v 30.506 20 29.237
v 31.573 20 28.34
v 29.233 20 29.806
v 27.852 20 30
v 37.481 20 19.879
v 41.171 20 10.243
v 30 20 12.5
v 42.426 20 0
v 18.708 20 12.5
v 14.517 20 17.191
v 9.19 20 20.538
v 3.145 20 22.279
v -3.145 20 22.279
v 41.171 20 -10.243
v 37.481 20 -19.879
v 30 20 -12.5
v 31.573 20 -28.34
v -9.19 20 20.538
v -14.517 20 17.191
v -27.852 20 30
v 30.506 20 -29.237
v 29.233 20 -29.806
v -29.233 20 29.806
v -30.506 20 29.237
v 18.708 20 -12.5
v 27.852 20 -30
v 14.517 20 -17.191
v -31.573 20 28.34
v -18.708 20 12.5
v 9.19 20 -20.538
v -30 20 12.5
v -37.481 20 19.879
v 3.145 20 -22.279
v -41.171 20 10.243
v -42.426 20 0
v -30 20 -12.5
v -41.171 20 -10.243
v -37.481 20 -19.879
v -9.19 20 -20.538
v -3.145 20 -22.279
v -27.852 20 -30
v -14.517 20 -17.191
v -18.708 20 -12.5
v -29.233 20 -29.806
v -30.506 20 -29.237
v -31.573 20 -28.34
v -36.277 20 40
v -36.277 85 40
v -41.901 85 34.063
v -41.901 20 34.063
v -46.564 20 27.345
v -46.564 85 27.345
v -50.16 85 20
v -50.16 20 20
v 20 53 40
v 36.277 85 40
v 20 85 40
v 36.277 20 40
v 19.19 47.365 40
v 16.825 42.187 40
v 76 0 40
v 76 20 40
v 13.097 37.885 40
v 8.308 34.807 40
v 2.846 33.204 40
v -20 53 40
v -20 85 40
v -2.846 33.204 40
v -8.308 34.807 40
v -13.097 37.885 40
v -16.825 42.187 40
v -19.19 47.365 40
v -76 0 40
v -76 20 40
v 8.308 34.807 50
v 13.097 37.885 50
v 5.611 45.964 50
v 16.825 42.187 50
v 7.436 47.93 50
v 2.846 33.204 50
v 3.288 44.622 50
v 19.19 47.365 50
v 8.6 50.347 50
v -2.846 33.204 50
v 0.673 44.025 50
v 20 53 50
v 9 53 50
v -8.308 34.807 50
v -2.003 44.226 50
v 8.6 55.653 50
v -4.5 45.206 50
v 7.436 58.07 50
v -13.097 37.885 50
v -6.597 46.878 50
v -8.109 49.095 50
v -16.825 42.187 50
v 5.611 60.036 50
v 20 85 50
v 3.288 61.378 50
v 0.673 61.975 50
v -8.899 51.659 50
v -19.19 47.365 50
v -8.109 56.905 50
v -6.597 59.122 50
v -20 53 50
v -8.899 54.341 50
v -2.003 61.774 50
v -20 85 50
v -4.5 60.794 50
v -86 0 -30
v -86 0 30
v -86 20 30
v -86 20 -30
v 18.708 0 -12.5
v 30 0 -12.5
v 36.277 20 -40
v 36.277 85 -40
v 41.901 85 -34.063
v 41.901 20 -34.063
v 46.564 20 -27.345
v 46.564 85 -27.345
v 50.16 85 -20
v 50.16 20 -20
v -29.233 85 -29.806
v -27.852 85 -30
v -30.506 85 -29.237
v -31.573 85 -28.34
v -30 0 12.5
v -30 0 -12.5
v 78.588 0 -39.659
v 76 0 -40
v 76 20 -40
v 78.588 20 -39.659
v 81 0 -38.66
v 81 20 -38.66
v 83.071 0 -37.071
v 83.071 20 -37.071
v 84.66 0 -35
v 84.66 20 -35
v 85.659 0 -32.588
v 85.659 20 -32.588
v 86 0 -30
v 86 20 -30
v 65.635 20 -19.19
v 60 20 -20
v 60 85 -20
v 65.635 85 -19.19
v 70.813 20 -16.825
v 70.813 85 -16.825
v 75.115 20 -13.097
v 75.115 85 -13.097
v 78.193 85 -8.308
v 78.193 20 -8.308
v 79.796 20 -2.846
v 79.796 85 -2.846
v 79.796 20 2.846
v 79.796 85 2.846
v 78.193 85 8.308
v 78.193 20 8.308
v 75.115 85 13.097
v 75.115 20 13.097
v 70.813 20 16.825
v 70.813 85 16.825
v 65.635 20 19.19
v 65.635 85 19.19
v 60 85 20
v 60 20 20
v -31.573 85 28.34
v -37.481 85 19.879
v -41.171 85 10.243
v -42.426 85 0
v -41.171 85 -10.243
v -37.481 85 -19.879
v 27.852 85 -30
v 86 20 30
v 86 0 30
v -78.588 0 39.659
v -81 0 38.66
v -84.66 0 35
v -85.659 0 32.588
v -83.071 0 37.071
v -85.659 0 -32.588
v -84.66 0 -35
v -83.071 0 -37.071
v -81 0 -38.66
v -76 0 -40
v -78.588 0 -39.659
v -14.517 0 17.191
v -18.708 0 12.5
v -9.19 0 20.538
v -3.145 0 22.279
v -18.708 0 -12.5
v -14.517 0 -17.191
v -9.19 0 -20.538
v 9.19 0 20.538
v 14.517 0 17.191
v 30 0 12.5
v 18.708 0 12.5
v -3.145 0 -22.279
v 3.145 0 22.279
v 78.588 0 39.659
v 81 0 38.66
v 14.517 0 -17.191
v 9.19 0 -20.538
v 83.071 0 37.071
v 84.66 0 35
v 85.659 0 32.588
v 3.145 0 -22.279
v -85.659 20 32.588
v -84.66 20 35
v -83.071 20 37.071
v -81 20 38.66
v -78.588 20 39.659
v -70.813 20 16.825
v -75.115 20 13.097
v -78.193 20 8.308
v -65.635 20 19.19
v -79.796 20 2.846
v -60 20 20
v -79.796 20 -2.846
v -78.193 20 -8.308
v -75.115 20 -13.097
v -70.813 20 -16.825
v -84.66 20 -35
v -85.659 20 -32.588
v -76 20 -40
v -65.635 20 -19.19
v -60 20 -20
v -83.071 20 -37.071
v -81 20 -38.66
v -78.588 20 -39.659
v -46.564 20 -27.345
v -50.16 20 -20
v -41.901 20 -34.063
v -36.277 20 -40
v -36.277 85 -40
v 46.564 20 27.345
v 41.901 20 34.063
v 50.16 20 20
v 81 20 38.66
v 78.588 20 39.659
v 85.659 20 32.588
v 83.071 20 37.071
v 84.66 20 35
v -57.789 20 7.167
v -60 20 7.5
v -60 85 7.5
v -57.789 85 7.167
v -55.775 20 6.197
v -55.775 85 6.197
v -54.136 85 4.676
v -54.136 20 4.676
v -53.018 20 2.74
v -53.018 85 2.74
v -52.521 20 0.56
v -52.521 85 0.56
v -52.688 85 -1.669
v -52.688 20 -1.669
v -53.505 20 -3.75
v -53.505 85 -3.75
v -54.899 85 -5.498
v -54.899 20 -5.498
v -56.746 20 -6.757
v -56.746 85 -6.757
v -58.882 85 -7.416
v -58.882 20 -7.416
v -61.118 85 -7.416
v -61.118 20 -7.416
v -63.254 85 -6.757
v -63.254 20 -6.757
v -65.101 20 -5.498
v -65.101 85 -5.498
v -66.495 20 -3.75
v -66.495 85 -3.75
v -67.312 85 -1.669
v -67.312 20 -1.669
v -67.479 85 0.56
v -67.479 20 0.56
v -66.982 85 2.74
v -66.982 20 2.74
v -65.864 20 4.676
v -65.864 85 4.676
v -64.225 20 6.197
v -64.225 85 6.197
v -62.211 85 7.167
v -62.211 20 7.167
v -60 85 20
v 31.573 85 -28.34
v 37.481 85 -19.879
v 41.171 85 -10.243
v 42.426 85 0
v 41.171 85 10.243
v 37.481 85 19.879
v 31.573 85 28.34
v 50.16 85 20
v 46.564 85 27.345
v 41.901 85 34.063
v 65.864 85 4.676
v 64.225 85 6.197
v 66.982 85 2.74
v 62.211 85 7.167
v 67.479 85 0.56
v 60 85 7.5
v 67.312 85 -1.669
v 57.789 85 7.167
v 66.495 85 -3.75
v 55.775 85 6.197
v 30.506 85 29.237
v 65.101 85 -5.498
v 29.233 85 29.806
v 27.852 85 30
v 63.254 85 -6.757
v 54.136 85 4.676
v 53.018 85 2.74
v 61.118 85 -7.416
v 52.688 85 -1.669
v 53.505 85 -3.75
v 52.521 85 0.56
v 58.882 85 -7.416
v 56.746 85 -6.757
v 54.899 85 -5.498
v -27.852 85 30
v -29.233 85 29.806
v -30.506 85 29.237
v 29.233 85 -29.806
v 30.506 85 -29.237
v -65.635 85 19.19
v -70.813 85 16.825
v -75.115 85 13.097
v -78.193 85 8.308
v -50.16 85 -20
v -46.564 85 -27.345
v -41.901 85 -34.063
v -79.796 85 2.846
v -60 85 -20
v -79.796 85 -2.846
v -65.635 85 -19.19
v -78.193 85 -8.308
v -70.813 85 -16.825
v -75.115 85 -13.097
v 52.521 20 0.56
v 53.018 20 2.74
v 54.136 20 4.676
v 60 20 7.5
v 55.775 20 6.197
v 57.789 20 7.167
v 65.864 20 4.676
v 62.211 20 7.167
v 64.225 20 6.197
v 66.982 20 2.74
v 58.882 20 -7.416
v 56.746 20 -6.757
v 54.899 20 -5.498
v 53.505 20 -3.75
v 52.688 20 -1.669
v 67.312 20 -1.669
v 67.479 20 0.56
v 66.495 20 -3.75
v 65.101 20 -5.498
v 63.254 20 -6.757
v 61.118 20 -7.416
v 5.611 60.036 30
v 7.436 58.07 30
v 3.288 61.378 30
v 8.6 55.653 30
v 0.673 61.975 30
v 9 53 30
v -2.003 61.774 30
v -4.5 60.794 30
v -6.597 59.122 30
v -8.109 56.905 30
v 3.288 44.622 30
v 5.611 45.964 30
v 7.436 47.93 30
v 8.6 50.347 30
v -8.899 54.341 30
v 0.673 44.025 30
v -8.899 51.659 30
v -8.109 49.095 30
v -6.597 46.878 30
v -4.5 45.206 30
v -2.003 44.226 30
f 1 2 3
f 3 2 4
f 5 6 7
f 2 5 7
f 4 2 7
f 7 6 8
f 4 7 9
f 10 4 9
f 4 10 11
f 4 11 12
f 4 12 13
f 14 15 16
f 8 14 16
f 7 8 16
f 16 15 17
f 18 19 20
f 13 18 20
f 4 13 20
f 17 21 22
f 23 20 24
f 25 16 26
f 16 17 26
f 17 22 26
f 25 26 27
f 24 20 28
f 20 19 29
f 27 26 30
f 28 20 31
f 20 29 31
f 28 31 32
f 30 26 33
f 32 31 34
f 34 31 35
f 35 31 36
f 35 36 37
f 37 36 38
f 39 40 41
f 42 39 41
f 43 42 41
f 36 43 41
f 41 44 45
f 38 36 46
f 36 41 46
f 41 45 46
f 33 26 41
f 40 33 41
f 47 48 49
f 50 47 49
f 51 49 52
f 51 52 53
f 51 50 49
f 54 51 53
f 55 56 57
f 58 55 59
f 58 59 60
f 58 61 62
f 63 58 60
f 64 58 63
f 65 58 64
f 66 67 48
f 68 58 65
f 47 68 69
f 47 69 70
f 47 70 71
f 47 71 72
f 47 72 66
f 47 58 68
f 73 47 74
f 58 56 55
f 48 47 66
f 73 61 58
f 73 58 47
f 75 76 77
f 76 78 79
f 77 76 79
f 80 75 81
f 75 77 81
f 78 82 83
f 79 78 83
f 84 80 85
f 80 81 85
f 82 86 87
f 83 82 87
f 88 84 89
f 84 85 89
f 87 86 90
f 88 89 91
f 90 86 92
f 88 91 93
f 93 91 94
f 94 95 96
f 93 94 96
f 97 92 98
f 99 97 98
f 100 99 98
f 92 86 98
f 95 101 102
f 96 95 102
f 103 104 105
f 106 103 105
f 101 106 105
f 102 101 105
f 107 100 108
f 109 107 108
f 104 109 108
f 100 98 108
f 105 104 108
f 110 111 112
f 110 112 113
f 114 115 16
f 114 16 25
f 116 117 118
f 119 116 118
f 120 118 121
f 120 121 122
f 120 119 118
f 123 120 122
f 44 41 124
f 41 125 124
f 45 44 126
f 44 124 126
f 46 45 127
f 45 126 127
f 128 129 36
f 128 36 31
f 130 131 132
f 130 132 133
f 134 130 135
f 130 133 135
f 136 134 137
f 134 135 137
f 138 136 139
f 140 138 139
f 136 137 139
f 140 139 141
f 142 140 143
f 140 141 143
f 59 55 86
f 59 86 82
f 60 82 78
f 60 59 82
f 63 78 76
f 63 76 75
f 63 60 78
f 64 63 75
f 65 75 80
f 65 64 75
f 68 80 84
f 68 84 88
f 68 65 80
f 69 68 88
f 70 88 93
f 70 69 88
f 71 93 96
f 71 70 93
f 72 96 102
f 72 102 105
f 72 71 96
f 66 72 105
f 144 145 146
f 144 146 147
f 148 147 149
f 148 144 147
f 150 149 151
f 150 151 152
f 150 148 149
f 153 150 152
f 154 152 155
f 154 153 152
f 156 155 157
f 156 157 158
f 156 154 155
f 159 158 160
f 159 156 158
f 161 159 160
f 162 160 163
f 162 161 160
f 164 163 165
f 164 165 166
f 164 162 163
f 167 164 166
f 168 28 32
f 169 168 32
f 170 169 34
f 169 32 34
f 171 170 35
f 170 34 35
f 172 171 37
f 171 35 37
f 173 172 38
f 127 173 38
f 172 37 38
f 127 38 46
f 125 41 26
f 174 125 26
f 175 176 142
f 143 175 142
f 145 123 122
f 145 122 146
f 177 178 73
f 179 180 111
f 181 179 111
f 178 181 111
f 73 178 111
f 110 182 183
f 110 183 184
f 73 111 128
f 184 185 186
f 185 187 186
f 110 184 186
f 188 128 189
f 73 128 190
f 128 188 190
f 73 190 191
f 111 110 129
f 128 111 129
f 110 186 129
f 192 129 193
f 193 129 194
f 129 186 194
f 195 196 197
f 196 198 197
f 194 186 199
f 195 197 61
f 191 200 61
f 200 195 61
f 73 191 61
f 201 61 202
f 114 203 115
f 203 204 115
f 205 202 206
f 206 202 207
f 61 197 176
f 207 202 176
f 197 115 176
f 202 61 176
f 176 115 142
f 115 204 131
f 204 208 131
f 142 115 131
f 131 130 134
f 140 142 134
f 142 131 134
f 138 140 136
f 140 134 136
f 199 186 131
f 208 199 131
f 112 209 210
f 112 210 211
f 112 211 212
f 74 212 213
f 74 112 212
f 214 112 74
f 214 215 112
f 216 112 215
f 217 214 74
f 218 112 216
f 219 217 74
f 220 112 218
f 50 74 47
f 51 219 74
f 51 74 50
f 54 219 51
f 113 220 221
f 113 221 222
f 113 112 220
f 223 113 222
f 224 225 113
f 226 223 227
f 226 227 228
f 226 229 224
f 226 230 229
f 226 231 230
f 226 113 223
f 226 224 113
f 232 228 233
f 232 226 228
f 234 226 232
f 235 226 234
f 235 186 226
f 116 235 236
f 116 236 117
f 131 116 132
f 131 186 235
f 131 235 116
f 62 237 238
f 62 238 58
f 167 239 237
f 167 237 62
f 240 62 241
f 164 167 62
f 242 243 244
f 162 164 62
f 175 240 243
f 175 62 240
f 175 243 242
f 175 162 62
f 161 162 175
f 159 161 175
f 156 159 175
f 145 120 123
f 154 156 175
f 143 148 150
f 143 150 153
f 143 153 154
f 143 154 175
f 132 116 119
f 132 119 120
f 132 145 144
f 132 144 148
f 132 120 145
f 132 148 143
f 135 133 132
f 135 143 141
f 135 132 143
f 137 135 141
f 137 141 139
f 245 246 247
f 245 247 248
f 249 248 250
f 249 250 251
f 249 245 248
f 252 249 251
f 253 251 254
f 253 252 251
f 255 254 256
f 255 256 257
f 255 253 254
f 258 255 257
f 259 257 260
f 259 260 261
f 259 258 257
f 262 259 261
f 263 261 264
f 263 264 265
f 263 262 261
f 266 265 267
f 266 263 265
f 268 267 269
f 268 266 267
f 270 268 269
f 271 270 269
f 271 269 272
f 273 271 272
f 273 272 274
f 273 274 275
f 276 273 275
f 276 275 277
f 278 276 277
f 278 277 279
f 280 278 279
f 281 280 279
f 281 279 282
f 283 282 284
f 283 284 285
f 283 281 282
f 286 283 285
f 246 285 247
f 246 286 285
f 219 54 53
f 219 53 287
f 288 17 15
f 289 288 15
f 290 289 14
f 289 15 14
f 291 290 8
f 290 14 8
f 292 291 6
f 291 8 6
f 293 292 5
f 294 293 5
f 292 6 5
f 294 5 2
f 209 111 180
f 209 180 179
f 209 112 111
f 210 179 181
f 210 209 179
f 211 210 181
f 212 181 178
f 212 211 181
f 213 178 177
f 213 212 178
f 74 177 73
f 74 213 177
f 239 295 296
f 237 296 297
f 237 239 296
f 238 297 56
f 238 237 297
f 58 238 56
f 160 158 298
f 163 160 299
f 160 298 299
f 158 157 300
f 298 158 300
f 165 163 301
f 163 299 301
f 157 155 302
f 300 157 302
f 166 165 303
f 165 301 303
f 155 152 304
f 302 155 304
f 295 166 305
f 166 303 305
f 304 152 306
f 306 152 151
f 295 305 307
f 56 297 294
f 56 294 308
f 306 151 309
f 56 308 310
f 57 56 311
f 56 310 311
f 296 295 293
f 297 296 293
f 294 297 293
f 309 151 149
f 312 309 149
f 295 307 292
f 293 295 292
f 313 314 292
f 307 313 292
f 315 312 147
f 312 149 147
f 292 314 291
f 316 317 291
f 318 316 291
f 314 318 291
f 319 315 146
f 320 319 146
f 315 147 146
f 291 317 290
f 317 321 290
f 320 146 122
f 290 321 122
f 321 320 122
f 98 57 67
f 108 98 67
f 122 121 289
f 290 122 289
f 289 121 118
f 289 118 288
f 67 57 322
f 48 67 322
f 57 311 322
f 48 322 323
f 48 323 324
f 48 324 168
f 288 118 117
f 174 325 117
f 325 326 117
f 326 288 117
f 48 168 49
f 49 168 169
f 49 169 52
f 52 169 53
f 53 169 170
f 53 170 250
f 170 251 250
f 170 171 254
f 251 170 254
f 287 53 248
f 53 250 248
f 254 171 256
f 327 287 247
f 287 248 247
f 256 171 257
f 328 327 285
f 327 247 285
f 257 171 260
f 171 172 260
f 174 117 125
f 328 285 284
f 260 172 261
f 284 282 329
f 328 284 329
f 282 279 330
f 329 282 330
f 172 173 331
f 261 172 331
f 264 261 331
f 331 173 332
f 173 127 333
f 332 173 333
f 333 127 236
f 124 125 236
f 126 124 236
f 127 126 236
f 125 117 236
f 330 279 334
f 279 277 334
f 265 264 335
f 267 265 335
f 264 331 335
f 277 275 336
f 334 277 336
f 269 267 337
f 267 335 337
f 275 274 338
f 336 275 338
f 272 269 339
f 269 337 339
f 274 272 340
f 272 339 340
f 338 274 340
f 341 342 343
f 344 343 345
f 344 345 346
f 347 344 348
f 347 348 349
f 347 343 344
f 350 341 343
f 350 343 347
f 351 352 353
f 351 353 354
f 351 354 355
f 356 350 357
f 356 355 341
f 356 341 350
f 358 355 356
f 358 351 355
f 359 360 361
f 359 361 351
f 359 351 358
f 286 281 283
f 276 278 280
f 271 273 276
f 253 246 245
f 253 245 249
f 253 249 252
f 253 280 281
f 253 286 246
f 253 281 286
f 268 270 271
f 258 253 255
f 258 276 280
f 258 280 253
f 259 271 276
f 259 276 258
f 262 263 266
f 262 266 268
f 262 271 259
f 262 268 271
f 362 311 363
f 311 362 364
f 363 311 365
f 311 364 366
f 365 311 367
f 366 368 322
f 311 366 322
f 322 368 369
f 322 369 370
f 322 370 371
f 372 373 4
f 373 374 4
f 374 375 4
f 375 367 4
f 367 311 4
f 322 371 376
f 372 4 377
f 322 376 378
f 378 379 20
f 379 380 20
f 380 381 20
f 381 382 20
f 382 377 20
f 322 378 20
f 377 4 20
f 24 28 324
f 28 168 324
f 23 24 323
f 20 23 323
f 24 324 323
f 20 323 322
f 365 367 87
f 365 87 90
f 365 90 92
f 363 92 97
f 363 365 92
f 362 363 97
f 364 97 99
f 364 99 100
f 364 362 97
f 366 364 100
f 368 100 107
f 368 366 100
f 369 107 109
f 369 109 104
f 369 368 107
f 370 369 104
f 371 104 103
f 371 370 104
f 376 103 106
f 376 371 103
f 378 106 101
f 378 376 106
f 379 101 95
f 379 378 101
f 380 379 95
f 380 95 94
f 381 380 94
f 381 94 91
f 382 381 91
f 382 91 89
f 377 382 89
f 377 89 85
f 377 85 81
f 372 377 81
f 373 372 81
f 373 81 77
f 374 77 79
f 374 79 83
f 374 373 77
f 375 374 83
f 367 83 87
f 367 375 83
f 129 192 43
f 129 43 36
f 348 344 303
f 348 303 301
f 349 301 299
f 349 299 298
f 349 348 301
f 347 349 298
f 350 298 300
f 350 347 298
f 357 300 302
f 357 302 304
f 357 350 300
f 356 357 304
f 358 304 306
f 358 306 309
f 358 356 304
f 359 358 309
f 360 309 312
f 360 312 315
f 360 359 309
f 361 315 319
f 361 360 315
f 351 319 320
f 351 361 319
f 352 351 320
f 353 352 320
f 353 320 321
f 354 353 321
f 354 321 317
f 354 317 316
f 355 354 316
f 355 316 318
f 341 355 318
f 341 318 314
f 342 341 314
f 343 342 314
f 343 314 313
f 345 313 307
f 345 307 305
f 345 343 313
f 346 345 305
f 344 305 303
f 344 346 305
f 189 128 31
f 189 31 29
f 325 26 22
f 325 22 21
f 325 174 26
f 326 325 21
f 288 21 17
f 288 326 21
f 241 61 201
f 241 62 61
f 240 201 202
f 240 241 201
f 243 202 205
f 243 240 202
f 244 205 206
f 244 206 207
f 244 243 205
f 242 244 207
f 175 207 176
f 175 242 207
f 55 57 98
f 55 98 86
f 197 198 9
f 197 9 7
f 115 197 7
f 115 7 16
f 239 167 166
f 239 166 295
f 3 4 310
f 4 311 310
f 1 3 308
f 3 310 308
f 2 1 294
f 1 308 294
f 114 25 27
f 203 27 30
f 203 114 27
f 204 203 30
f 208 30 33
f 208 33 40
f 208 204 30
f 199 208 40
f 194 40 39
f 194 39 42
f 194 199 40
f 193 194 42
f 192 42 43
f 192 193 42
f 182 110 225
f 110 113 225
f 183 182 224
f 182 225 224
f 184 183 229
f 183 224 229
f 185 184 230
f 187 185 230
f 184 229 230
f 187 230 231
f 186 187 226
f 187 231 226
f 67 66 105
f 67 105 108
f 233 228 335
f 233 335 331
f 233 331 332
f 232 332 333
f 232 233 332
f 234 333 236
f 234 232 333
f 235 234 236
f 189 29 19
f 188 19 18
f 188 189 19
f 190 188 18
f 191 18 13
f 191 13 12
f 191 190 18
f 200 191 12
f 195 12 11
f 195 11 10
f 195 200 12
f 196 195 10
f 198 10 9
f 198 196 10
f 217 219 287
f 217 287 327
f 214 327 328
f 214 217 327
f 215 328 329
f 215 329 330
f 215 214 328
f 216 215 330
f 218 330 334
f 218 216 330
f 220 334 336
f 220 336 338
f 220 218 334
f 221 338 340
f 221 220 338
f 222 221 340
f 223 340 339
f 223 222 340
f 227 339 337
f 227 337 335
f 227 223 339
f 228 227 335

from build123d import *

# Parameters (mm, degrees)
SKETCH_1_W               = 172
SKETCH_1_H               = 80
EXTRUDE_1_DEPTH          = 20
FILLET_1_R               = 10
SKETCH_2_R               = 7.5
EXTRUDE_2_DEPTH          = 65
CUT_EXTRUDE_1_DEPTH      = 65
EXTRUDE_3_DEPTH          = 10
CUT_EXTRUDE_2_DEPTH      = 10
CUT_EXTRUDE_2_DEPTH_BACK = 10
SKETCH_5_R               = 9
FILLET_2_R               = 5


with BuildPart() as part:
    # 草图1 → 凸台-拉伸1 (new body)
    with BuildSketch(Plane(origin=(0, 0, 0), x_dir=(1, 0, 0), z_dir=(0, 1, 0))):
        Rectangle(SKETCH_1_W, SKETCH_1_H)
        with BuildLine():
            Line((-30, -12.5), (-18.708286934, -12.5))
            ThreePointArc((-18.708286934, -12.5), (0, -22.5), (18.708286934, -12.5))
            Line((18.708286934, -12.5), (30, -12.5))
            Line((30, -12.5), (30, 12.5))
            Line((30, 12.5), (18.708286934, 12.5))
            ThreePointArc((18.708286934, 12.5), (0, 22.5), (-18.708286934, 12.5))
            Line((-18.708286934, 12.5), (-30, 12.5))
            Line((-30, 12.5), (-30, -12.5))
        make_face(mode=Mode.SUBTRACT)
    extrude(amount=EXTRUDE_1_DEPTH)

    # 圆角1
    fillet_1_edges = [part.edges().sort_by_distance(p)[0] for p in [
        (86, 10, -40),
        (86, 10, 40),
        (-86, 10, 40),
        (-86, 10, -40),
    ]]
    fillet(fillet_1_edges, radius=FILLET_1_R)

    # 草图2 → 凸台-拉伸2 (add)
    with BuildSketch(Plane(origin=(0, 20, 0), x_dir=(1, 0, 0), z_dir=(0, 1, 0))):
        with BuildLine():
            Line((-36.276714294, 40), (36.276714294, 40))
            ThreePointArc((36.276714294, 40), (44.36006499, 30.792606809), (50.159744816, 20))
            Line((50.159744816, 20), (60, 20))
            ThreePointArc((60, 20), (80, 0), (60, -20))
            Line((60, -20), (50.159744816, -20))
            ThreePointArc((50.159744816, -20), (44.36006499, -30.792606809), (36.276714294, -40))
            Line((36.276714294, -40), (-36.276714294, -40))
            ThreePointArc((-36.276714294, -40), (-44.36006499, -30.792606809), (-50.159744816, -20))
            Line((-50.159744816, -20), (-60, -20))
            ThreePointArc((-60, -20), (-80, 0), (-60, 20))
            Line((-60, 20), (-50.159744816, 20))
            ThreePointArc((-50.159744816, 20), (-44.36006499, 30.792606809), (-36.276714294, 40))
        make_face()
        with Locations((-60, 0)):
            Circle(SKETCH_2_R, mode=Mode.SUBTRACT)
        with Locations((60, 0)):
            Circle(SKETCH_2_R, mode=Mode.SUBTRACT)
    extrude(amount=EXTRUDE_2_DEPTH)

    # 草图3 → 切除-拉伸1 (cut)
    with BuildSketch(Plane(origin=(0, 20, 0), x_dir=(1, 0, 0), z_dir=(0, 1, 0))):
        with BuildLine():
            Line((-30, 30), (30, 30))
            ThreePointArc((30, 30), (42.426406871, 0), (30, -30))
            Line((30, -30), (-30, -30))
            ThreePointArc((-30, -30), (-42.426406871, 0), (-30, 30))
        make_face()
    extrude(amount=CUT_EXTRUDE_1_DEPTH, mode=Mode.SUBTRACT)

    # 草图4 → 凸台-拉伸3 (add)
    with BuildSketch(Plane.XY.offset(40)):
        with BuildLine():
            Line((-20, 53), (-20, 85))
            Line((-20, 85), (20, 85))
            Line((20, 85), (20, 53))
            ThreePointArc((20, 53), (0, 33), (-20, 53))
        make_face()
    extrude(amount=EXTRUDE_3_DEPTH)

    # 草图5 → 切除-拉伸2 (cut, two sides: drawn at the far end of the back side and taken through both)
    with BuildSketch(Plane.XY.offset(40).offset(-CUT_EXTRUDE_2_DEPTH_BACK)):
        with Locations((0, 53)):
            Circle(SKETCH_5_R)
    extrude(amount=CUT_EXTRUDE_2_DEPTH + CUT_EXTRUDE_2_DEPTH_BACK, mode=Mode.SUBTRACT)

    # 圆角2
    fillet_2_edges = [part.edges().sort_by_distance(p)[0] for p in [
        (-30, 52.5, 30),
        (30, 52.5, 30),
        (30, 52.5, -30),
        (-30, 52.5, -30),
    ]]
    fillet(fillet_2_edges, radius=FILLET_2_R)


solid = part.part
